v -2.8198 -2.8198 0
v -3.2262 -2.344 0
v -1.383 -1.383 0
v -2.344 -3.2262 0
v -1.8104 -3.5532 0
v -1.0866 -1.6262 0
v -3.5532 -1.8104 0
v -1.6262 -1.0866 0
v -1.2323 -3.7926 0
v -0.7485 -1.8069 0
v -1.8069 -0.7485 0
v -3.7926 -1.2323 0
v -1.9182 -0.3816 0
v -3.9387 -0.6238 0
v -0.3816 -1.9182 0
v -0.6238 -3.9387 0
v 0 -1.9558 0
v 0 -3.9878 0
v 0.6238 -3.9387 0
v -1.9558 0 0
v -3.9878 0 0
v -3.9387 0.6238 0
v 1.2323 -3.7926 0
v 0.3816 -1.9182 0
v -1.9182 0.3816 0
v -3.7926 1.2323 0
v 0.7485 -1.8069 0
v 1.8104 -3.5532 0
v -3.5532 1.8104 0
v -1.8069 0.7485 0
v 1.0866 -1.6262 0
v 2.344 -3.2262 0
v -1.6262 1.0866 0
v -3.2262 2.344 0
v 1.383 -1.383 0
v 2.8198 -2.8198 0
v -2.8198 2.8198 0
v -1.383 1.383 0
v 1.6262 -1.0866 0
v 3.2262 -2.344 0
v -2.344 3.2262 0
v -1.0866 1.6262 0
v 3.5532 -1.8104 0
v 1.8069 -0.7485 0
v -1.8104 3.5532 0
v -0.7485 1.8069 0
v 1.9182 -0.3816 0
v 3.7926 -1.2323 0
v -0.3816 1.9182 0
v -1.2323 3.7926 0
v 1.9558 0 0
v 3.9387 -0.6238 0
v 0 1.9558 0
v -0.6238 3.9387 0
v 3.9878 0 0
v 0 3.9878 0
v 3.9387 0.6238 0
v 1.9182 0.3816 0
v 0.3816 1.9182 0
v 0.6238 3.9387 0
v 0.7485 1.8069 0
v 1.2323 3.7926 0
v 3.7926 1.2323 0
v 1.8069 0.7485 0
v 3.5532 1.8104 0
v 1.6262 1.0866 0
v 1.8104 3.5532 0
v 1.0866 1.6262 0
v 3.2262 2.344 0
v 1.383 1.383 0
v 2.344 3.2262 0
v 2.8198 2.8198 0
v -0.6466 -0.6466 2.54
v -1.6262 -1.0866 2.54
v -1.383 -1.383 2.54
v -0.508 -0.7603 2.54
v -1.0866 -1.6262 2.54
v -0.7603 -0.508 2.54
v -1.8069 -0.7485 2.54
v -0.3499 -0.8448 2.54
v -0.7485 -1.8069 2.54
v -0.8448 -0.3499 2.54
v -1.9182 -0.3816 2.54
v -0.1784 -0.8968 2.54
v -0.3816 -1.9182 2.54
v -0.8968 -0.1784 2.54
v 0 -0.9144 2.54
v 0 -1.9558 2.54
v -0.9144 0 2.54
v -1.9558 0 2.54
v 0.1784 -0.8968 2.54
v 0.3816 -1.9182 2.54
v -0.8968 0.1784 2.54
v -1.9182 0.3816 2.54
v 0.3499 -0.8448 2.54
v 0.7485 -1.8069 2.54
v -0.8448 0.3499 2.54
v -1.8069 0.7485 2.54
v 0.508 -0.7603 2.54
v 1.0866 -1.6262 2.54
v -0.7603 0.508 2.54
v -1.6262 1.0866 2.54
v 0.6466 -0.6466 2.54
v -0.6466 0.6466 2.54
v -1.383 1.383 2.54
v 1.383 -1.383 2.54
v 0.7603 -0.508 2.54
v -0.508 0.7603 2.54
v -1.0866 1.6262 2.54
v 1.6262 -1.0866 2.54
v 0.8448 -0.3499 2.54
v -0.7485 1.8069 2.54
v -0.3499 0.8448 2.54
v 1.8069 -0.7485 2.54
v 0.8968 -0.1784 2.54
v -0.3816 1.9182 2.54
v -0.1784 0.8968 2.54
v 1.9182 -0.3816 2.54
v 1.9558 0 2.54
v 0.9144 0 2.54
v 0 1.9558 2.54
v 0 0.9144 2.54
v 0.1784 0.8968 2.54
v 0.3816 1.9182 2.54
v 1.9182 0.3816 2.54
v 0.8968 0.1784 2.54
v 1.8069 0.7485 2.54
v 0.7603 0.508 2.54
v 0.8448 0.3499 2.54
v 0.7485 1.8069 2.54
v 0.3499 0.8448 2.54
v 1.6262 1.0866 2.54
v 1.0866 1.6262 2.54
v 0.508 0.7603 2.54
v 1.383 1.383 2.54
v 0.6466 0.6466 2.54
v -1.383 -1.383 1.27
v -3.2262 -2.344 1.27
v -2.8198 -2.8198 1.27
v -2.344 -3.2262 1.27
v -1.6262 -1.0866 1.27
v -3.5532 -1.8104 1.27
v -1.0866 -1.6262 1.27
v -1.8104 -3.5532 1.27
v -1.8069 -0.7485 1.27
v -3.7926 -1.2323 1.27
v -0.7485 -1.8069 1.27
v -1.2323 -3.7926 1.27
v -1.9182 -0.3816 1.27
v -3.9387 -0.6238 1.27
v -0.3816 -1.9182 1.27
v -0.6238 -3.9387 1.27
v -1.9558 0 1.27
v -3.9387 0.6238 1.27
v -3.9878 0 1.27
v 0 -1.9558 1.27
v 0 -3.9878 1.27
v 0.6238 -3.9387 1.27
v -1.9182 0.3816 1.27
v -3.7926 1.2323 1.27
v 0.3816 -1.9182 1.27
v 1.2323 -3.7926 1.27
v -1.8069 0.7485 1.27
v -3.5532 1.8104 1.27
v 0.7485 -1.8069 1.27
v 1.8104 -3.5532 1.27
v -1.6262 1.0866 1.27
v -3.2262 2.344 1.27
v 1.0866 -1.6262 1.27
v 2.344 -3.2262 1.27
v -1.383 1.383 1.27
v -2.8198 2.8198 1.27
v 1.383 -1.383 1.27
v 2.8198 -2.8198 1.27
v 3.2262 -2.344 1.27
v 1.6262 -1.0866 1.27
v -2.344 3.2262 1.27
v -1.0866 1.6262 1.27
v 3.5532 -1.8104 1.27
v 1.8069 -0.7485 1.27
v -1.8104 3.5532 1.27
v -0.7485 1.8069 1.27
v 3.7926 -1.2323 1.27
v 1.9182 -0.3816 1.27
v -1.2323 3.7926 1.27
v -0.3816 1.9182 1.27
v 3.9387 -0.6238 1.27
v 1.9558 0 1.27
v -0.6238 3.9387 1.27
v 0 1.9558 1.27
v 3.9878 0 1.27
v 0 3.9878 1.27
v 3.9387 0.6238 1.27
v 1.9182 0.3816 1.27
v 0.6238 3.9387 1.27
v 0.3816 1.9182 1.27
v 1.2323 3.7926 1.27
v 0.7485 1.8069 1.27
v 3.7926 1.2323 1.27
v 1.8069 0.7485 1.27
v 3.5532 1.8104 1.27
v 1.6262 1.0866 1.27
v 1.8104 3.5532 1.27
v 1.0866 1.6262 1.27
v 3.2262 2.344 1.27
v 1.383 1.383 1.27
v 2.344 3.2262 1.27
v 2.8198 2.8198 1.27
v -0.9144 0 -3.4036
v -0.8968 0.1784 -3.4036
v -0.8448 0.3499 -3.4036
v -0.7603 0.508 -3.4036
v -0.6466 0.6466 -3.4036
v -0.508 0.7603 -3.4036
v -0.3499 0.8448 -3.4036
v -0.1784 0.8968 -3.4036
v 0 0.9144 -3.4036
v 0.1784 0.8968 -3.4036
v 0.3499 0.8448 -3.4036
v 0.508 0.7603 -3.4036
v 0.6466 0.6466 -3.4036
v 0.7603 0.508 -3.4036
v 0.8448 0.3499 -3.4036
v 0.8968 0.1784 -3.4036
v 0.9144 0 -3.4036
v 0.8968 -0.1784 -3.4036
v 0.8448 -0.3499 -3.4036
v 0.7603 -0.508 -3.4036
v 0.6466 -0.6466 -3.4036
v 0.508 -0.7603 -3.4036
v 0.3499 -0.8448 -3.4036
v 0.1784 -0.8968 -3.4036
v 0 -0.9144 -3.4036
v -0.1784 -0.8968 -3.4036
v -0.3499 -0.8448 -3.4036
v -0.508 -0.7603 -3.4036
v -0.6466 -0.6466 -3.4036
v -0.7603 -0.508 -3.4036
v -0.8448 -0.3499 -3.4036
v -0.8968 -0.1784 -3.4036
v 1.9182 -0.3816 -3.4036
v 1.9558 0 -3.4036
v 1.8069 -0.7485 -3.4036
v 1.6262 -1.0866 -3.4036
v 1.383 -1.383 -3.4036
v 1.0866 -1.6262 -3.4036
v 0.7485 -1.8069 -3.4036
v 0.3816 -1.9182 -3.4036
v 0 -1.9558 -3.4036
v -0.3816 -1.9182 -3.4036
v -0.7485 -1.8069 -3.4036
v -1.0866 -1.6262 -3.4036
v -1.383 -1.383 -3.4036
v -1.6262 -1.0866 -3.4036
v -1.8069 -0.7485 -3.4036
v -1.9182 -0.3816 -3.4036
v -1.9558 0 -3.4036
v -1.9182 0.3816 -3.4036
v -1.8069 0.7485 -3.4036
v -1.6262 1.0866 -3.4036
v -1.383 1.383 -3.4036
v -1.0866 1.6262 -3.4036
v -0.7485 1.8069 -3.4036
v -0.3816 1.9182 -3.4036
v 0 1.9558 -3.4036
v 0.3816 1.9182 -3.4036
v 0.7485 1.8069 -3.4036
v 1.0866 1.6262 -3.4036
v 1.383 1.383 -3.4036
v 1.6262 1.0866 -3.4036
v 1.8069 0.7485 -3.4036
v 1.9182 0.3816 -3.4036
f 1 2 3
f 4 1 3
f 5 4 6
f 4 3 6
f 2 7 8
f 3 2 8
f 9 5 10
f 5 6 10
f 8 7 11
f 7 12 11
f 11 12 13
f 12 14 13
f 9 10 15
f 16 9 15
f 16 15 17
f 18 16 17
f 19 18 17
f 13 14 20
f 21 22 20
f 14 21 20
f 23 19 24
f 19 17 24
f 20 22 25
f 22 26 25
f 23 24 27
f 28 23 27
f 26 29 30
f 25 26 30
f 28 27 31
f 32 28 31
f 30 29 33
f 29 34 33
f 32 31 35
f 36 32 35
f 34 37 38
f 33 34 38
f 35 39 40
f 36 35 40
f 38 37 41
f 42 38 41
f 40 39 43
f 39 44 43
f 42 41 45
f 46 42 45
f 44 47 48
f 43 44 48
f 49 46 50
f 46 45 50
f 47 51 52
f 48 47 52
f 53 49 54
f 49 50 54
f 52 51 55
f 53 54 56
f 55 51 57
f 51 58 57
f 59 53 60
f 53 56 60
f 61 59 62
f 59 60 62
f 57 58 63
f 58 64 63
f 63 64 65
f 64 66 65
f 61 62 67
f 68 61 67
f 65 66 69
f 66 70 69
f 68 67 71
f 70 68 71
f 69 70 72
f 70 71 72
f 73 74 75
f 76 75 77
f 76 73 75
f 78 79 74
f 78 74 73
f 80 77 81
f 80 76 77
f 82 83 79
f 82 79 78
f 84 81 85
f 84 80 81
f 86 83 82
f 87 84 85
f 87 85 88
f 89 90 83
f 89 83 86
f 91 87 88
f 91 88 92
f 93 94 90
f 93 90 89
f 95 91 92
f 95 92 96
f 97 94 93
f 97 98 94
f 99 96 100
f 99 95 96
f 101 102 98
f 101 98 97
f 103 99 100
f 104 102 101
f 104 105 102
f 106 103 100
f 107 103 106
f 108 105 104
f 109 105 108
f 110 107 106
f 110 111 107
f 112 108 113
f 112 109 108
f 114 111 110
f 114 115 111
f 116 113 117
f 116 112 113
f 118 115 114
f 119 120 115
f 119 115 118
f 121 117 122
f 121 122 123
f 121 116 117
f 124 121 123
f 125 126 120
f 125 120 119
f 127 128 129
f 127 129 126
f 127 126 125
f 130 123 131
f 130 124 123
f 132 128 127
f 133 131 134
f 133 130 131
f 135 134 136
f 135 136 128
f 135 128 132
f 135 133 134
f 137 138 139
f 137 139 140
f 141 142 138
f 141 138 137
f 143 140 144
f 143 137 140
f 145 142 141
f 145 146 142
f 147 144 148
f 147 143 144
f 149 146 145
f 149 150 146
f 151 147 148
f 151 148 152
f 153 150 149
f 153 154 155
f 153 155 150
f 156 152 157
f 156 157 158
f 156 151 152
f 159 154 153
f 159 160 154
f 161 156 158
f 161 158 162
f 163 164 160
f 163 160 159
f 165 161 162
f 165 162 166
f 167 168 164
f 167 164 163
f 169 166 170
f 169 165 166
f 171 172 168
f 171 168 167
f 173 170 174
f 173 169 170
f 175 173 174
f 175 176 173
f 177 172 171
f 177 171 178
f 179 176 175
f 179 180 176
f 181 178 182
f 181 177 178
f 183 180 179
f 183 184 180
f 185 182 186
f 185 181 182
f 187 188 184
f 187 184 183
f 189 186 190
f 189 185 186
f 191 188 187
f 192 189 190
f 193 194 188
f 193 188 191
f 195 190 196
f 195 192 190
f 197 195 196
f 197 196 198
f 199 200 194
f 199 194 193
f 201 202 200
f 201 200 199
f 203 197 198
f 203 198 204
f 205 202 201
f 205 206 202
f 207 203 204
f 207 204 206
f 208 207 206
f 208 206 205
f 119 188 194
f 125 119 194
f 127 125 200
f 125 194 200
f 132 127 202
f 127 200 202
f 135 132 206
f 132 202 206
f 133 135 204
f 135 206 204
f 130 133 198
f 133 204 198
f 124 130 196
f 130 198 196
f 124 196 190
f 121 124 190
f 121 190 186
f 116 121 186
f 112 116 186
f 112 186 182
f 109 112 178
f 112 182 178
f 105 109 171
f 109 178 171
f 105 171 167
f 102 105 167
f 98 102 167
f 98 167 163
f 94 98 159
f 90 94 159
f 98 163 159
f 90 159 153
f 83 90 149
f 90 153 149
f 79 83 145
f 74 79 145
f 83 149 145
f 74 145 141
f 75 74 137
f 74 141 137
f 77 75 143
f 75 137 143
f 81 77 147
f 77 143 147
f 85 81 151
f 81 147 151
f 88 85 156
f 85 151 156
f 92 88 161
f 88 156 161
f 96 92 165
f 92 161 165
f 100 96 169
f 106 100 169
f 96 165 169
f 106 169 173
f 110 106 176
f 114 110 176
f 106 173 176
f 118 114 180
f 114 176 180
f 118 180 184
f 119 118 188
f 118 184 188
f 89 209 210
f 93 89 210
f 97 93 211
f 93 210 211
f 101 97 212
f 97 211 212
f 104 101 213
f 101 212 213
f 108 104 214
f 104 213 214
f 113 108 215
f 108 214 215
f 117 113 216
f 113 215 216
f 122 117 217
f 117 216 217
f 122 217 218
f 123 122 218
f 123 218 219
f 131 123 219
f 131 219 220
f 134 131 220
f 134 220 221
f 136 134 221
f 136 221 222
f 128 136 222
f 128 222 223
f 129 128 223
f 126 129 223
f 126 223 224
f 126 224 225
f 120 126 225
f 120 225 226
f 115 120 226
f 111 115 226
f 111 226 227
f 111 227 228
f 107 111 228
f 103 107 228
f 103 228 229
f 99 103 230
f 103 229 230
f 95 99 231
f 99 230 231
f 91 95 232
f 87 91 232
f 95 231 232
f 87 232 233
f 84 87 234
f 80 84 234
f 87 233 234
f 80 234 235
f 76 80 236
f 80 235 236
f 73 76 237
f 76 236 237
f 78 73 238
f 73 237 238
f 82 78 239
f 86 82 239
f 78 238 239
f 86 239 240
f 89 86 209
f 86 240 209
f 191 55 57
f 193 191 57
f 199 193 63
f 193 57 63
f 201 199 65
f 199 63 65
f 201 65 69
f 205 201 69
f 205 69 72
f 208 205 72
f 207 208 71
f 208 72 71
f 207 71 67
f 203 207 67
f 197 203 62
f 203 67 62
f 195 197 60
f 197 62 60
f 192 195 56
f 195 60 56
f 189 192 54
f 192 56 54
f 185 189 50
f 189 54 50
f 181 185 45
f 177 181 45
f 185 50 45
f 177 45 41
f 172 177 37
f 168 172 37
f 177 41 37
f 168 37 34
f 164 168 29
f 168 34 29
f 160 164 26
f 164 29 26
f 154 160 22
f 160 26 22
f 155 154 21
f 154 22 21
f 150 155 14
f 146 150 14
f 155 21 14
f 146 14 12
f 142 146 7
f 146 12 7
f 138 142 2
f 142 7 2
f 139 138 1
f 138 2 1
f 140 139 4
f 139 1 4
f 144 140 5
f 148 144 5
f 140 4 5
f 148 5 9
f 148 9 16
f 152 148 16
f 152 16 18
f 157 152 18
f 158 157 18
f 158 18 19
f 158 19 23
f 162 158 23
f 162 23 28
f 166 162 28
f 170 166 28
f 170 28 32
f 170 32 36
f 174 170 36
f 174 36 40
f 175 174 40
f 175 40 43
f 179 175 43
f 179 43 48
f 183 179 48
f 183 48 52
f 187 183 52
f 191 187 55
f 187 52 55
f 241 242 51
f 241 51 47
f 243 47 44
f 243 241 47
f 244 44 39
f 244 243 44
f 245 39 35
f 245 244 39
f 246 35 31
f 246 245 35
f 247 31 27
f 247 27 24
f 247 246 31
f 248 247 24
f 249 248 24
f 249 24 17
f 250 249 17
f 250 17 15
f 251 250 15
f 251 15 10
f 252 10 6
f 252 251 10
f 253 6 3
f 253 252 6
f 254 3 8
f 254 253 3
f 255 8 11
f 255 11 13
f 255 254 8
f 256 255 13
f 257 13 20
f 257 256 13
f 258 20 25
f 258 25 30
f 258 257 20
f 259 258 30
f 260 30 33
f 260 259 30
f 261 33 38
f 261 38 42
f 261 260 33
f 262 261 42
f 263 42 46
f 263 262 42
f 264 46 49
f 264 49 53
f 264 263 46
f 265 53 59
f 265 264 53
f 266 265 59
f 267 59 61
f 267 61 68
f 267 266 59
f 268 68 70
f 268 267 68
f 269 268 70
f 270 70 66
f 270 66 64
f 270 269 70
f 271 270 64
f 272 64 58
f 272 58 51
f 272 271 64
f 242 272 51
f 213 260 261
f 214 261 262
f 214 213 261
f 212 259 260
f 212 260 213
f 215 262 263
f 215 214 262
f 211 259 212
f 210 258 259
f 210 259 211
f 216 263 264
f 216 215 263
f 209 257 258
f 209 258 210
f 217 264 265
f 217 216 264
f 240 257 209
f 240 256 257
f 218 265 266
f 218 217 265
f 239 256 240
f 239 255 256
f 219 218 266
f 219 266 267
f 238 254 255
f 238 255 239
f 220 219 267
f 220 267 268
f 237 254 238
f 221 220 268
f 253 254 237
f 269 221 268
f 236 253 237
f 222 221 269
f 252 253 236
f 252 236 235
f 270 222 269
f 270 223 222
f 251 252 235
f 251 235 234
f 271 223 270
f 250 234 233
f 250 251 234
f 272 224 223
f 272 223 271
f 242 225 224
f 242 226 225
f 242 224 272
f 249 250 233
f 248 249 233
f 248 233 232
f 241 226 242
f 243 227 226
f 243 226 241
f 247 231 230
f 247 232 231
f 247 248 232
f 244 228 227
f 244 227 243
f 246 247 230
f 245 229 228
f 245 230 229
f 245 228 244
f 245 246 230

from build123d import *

# Parameters (mm, degrees)
SKETCH1_R           = 3.9878
BOSS_EXTRUDE1_DEPTH = 1.27
SKETCH2_R           = 1.9558
SKETCH2_R_2         = 0.9144
BOSS_EXTRUDE2_DEPTH = 1.27
BOSS_EXTRUDE3_START = 3.4036
SKETCH3_R           = 1.9558
BOSS_EXTRUDE3_DEPTH = 3.4036
SKETCH4_R           = 0.9144
CUT_EXTRUDE1_DEPTH  = 9.193380172


with BuildPart() as part:
    # Sketch1 → Boss-Extrude1 (new body)
    with BuildSketch(Plane.XY):
        Circle(SKETCH1_R)
    extrude(amount=BOSS_EXTRUDE1_DEPTH)

    # Sketch2 → Boss-Extrude2 (add)
    with BuildSketch(Plane.XY.offset(1.27)):
        Circle(SKETCH2_R)
        Circle(SKETCH2_R_2, mode=Mode.SUBTRACT)
    extrude(amount=BOSS_EXTRUDE2_DEPTH)

    # Sketch3 → Boss-Extrude3 (add)
    with BuildSketch(Plane(origin=(0, 0, 0), x_dir=(-1, 0, 0), z_dir=(0, 0, -1)).offset(BOSS_EXTRUDE3_START)):
        with Locations(Location((0, 0, 0), (0, 0, 180))):
            Circle(SKETCH3_R)
    extrude(amount=-BOSS_EXTRUDE3_DEPTH)

    # Sketch4 → Cut-Extrude1 (cut, through all)
    with BuildSketch(Plane(origin=(0, 0, -3.4036), x_dir=(-1, 0, 0), z_dir=(0, 0, -1))):
        Circle(SKETCH4_R)
    extrude(amount=-CUT_EXTRUDE1_DEPTH, mode=Mode.SUBTRACT)


solid = part.part
